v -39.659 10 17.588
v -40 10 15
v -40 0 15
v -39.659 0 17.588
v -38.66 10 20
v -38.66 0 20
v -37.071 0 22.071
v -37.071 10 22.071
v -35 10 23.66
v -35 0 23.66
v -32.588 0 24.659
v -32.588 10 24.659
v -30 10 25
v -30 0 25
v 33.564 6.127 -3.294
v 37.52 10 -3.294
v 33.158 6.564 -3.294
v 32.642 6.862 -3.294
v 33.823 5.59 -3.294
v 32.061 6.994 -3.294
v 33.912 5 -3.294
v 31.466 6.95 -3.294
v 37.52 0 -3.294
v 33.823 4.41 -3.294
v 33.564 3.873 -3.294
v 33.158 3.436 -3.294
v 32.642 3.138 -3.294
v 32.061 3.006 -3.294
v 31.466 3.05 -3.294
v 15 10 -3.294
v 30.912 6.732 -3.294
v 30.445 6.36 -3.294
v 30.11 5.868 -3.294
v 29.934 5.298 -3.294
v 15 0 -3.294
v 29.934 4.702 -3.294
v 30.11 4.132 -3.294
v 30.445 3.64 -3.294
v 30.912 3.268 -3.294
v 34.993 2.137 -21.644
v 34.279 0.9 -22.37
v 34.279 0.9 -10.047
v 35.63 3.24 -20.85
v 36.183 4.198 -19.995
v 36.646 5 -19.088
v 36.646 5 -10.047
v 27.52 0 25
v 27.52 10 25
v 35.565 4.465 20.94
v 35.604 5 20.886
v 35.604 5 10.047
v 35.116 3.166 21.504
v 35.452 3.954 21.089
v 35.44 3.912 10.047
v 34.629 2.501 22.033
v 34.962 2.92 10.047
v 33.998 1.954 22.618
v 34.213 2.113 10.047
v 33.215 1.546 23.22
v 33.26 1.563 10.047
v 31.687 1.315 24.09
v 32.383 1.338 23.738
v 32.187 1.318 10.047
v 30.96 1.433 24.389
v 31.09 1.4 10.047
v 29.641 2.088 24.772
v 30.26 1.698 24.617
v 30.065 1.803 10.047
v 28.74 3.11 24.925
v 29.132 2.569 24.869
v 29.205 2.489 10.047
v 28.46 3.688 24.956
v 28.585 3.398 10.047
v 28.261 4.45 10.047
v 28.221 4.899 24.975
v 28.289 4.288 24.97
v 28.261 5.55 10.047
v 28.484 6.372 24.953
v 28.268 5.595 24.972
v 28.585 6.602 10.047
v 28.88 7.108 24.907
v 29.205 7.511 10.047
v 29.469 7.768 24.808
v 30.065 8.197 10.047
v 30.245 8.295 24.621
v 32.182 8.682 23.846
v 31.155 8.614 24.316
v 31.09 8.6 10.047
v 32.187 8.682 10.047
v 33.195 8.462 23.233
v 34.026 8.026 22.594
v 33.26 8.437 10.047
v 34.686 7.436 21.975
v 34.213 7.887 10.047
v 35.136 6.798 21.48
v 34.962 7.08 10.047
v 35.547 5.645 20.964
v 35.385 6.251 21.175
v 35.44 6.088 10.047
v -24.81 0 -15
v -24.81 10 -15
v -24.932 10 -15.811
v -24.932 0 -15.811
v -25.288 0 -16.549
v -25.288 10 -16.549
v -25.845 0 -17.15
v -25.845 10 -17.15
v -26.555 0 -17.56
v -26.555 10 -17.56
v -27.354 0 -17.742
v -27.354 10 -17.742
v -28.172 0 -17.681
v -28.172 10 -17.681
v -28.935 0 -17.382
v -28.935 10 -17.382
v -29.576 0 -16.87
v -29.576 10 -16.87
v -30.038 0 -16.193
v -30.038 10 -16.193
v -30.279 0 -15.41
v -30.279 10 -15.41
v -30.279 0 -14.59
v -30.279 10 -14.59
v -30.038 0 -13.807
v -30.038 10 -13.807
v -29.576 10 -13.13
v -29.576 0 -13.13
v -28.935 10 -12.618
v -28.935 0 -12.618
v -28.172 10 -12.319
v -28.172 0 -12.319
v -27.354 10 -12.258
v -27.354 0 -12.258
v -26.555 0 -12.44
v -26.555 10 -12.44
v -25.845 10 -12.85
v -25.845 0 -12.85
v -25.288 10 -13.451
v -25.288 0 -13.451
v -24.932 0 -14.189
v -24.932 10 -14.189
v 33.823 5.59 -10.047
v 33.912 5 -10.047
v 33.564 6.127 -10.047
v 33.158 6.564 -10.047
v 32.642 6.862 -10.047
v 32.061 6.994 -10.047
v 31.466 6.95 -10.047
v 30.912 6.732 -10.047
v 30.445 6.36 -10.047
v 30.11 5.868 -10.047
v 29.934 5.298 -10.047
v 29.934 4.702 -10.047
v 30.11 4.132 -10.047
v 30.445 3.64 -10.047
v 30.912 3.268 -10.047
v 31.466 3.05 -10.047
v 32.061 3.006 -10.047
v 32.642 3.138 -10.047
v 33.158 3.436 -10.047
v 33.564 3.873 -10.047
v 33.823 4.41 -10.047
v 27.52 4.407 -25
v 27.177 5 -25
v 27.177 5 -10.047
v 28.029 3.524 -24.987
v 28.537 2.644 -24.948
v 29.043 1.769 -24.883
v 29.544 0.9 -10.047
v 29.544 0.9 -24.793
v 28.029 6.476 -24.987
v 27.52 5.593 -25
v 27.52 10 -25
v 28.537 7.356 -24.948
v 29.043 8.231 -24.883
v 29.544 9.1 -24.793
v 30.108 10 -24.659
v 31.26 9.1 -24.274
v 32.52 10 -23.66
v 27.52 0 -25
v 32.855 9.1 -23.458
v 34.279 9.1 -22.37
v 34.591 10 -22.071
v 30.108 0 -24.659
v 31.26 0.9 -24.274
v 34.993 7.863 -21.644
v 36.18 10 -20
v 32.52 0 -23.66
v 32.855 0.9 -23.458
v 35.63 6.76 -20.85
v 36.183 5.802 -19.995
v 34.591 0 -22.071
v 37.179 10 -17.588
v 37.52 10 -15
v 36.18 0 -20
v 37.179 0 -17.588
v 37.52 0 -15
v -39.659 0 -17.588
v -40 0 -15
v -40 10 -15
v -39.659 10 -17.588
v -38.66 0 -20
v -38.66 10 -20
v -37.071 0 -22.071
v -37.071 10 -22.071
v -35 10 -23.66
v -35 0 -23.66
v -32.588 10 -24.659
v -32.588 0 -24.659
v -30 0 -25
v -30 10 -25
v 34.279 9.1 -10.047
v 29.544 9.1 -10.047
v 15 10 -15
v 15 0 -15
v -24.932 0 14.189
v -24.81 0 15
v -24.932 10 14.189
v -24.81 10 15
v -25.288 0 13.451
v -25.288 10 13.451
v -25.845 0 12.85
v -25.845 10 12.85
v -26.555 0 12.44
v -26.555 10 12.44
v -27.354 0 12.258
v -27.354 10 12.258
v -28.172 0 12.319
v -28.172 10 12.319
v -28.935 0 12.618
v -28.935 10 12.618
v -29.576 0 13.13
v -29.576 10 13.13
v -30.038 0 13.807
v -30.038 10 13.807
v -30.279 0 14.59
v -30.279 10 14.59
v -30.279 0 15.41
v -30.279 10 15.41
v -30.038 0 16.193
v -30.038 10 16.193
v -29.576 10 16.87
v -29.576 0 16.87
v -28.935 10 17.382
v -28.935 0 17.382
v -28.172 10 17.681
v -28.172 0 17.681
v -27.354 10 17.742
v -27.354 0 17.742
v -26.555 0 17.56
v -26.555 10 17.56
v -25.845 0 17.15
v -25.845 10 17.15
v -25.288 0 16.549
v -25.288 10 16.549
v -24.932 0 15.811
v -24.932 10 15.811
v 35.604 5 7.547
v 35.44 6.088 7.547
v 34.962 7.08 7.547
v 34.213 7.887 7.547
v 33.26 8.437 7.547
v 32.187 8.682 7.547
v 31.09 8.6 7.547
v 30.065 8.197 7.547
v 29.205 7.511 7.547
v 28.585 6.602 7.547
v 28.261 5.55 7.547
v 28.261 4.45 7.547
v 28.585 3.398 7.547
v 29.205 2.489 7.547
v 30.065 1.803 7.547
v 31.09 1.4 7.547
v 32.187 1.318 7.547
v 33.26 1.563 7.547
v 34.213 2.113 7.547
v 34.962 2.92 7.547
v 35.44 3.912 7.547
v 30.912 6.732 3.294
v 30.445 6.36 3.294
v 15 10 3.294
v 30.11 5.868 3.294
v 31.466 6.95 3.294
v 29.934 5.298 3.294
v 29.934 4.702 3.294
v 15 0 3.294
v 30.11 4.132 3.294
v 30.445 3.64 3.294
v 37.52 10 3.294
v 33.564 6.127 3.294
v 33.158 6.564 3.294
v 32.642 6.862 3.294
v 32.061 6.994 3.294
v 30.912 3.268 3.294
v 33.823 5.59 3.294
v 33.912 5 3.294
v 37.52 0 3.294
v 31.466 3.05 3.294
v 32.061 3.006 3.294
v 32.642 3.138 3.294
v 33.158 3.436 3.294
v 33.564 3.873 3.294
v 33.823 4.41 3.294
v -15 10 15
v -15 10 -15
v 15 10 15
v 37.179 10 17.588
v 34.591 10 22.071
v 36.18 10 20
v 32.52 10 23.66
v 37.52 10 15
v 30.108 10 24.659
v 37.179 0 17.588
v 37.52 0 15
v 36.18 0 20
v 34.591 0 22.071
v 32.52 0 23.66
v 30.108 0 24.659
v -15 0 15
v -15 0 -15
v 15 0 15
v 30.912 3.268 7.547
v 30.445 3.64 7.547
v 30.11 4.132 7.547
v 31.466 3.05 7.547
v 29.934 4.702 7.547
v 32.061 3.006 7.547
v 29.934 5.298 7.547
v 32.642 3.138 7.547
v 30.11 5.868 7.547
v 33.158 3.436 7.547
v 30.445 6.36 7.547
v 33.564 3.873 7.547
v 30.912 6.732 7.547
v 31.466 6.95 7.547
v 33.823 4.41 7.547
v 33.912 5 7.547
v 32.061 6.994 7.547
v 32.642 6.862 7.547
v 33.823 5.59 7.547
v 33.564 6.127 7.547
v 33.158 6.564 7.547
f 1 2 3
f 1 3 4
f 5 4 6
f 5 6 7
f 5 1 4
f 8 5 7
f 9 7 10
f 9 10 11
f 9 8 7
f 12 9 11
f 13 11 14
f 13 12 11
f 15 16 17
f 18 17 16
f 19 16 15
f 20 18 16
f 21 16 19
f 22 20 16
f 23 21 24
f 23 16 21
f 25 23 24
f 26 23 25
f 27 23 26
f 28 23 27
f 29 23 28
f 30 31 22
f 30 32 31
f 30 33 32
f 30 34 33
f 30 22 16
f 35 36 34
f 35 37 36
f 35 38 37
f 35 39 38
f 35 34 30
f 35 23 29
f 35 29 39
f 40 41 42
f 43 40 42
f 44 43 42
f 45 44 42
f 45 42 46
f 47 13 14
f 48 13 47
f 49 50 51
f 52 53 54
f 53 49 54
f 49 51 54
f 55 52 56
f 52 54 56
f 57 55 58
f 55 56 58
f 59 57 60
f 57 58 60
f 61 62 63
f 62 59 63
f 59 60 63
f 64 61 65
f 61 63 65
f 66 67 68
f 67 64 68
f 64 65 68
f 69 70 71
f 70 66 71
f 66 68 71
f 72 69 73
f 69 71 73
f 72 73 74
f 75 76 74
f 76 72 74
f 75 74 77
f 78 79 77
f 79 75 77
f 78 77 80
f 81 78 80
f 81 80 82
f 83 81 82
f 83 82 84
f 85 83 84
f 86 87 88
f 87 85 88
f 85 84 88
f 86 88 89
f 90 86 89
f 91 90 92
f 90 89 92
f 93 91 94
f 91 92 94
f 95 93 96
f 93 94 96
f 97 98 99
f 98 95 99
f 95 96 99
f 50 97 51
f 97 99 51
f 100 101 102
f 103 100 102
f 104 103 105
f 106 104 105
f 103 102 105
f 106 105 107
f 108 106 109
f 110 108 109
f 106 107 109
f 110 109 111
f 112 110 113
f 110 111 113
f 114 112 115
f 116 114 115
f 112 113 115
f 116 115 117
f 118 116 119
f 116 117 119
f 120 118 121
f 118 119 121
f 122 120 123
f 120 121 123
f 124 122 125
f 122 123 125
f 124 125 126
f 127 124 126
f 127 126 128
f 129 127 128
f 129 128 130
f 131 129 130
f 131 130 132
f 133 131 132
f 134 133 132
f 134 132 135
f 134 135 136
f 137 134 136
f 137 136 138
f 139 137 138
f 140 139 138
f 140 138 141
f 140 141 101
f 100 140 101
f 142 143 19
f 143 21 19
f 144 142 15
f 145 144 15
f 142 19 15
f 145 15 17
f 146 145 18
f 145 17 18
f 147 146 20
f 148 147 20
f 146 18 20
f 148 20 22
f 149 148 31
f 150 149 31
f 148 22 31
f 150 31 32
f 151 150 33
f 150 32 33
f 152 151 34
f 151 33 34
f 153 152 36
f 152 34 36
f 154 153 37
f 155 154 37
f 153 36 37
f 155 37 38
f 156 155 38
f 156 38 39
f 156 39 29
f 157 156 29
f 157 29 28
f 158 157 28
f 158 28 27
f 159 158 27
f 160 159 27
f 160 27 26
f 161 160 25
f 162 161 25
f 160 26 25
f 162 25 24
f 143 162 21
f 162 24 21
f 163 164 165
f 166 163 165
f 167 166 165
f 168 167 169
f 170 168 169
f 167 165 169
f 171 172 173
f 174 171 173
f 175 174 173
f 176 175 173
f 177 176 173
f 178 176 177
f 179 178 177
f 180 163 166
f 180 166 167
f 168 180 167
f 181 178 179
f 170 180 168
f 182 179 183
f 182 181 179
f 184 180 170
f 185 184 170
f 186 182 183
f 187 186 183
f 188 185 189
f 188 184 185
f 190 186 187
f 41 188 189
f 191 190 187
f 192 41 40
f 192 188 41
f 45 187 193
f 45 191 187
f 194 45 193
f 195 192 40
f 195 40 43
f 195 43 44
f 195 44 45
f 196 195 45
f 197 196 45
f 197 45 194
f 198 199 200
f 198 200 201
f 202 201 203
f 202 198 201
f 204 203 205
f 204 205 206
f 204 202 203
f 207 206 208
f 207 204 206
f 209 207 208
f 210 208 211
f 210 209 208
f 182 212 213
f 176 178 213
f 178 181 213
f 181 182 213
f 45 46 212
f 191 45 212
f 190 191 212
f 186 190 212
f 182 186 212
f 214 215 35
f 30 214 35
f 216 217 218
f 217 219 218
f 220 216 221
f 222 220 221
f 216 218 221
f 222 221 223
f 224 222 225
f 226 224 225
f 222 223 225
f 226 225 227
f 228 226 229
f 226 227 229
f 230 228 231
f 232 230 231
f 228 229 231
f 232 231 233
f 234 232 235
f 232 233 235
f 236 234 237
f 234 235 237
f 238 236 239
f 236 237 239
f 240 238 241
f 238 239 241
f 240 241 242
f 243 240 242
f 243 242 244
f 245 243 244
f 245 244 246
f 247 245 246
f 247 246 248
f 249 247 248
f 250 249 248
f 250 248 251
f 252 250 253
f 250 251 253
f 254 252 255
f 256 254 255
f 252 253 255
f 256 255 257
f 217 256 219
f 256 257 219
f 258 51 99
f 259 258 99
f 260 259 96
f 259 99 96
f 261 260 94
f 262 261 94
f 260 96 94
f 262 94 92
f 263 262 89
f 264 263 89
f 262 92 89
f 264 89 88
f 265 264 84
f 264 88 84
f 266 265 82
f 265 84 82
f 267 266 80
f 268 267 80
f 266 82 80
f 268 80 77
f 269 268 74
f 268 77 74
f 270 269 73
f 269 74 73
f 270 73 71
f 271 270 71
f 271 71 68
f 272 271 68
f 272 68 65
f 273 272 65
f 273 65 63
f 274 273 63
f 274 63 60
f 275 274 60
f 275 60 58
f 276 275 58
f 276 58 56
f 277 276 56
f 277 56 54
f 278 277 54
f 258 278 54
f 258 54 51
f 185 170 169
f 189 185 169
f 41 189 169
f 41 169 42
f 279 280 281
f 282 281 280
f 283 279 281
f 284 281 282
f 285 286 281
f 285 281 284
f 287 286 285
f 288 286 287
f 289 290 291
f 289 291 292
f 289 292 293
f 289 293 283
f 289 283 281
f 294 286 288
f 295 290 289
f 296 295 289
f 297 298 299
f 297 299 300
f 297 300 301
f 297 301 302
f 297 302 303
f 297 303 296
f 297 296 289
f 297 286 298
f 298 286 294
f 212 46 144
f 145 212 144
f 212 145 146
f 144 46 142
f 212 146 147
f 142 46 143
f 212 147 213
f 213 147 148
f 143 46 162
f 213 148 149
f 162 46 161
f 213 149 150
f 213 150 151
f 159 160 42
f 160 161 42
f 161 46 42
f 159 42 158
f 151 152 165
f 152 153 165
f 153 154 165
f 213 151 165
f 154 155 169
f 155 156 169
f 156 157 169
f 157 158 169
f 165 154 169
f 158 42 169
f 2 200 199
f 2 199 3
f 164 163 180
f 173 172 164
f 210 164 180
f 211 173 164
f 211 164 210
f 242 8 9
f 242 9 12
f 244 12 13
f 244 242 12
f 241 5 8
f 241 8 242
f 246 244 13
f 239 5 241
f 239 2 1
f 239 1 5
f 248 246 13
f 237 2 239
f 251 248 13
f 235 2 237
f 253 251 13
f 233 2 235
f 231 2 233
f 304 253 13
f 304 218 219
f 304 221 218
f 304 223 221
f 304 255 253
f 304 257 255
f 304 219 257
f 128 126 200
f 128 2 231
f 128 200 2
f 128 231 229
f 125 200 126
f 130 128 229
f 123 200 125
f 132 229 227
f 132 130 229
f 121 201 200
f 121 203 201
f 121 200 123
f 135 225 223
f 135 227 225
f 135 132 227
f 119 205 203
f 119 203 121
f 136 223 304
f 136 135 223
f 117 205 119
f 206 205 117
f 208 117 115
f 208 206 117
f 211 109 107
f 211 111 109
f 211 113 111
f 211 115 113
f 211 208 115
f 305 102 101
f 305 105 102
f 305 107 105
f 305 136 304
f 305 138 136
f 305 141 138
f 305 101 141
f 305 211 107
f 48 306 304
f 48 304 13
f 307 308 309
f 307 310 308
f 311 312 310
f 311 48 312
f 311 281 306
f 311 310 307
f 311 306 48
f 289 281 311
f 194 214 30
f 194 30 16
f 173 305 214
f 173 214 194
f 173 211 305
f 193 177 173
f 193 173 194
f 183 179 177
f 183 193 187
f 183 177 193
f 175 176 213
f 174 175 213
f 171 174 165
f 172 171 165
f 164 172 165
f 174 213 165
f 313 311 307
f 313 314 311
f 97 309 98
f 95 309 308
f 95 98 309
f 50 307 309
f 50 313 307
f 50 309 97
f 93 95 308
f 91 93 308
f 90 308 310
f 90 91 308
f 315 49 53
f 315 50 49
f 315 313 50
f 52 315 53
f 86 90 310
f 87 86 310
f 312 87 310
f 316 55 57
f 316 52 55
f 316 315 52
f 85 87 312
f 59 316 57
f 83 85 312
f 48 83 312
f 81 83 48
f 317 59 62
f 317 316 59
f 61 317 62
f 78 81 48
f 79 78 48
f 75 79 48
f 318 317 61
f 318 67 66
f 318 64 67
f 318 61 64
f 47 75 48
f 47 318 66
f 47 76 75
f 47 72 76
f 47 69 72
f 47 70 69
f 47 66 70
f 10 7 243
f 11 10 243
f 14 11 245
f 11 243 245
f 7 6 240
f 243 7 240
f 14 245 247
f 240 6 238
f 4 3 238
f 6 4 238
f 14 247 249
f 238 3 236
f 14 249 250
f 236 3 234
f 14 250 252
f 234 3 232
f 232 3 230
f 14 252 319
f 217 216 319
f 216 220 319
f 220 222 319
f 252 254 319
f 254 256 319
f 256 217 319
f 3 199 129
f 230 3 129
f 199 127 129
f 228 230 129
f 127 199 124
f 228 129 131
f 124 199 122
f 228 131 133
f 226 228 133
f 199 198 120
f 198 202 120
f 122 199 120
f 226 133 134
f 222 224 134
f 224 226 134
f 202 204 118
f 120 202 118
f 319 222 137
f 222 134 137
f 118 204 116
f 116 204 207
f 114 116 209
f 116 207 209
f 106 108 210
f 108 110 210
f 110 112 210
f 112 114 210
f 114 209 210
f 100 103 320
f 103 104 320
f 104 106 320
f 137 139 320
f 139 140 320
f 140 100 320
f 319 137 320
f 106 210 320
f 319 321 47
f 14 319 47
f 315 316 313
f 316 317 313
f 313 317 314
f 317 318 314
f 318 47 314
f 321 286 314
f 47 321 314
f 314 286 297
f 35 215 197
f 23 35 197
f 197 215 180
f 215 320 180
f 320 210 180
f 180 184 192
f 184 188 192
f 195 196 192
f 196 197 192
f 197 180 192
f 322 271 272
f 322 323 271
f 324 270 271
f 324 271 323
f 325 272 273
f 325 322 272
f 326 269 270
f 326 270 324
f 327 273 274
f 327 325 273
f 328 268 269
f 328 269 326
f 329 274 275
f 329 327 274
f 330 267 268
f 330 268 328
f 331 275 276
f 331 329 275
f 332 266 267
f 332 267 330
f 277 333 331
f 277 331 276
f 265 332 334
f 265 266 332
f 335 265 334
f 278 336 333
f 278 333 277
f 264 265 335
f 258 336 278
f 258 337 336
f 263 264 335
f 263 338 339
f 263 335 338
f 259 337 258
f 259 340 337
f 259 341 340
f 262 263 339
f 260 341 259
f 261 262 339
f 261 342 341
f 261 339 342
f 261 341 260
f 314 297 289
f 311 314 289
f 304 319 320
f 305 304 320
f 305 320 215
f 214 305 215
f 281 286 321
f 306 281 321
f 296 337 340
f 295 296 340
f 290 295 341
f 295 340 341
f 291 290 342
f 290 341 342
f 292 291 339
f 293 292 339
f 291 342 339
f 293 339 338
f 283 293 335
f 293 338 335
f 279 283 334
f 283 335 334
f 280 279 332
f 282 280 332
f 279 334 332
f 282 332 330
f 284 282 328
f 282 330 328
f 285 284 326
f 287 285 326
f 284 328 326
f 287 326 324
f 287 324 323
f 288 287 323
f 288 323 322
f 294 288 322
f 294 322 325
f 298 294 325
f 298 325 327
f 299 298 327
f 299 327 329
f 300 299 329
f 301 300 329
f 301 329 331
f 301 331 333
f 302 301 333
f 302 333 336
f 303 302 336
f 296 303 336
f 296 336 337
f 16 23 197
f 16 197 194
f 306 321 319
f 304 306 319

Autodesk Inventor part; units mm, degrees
ref_plane "YZ Plane" through (0, 0, 0) normal (1, 0, 0) x (0, 1, 0)
ref_plane "XZ Plane" through (0, 0, 0) normal (0, 1, 0) x (-1, 0, 0)
ref_plane "XY Plane" through (0, 0, 0) normal (0, 0, 1) x (1, 0, 0)
sketch "Sketch1" plane through (0, 0, 0) normal (0, 1, 0) x (-1, 0, 0)
  line L0 (-15, 15) -> (15, 15)
  line L1 (15, 15) -> (15, -15)
  line L2 (15, -15) -> (-15, -15)
  line L3 (-15, 15) -> (15, -15) construction
  line L4 (15, 15) -> (-15, -15) construction
  line L5 (25, 25) -> (-25, 25)
  line L6 (-25.5008, -25) -> (24.4992, -25)
  line L7 (25, 25) -> (59.45, 25)
  line L8 (59.45, 25) -> (59.45, -25)
  line L9 (59.45, -25) -> (24.4992, -25)
  line L10 (-37.5196, -10.0467) -> (-25.5008, -10.0467)
  line L11 (-25, 10.0467) -> (-37.5196, 10.0467)
  line L12 (-37.5196, -3.2939) -> (-15, -3.2939)
  line L13 (-15, 3.2939) -> (-37.5196, 3.2939)
  line L14 (-37.5196, 10.0467) -> (-37.5196, 3.2939)
  line L15 (-37.5196, -3.2939) -> (-37.5196, -10.0467)
  line L16 (-25, 25) -> (-25, 10.0467)
  line L17 (-15, -15) -> (-15, -3.2939)
  line L18 (-15, 3.2939) -> (-15, 15)
  line L19 (-25.5008, -10.0467) -> (-25.5008, -25)
  point P0 (0, 0)
  point P1 (-30.7833, 0)
  point P2 (25, -25)
  dimension "d0" = 30
  dimension "d1" = 30
  dimension "d2" = 10
  dimension "d4" = 44.45
extrude "Extrusion1" add sketch "Sketch1" along normal blind 10
sketch "Sketch2" plane through (0, 0, 0) normal (0, -1, 0) x (1, 0, 0)
  line L0 (15, 15) -> (-15, 15) projected
  line L1 (15, 3.2939) -> (15, 15) projected
  line L2 (37.5196, 3.2939) -> (15, 3.2939) projected
  line L3 (37.5196, 10.0467) -> (37.5196, 3.2939) projected
  line L4 (25, 10.0467) -> (37.5196, 10.0467) projected
  line L5 (25, 25) -> (25, 10.0467) projected
  line L6 (-59.45, 25) -> (25, 25) projected
  line L7 (-59.45, -25) -> (-59.45, 25) projected
  line L8 (25.5008, -25) -> (-59.45, -25) projected
  line L9 (25.5008, -10.0467) -> (25.5008, -25) projected
  line L10 (37.5196, -10.0467) -> (25.5008, -10.0467) projected
  line L11 (37.5196, -3.2939) -> (37.5196, -10.0467) projected
  line L12 (15, -3.2939) -> (37.5196, -3.2939) projected
  line L13 (15, -15) -> (15, -3.2939) projected
  line L14 (-15, -15) -> (15, -15) projected
  line L15 (-15, 15) -> (-15, -15) projected
  line L16 (-49.725, -25) -> (-24.725, -25)
  line L17 (-24.725, -25) -> (-24.725, 25)
  line L18 (-24.725, 25) -> (-49.725, 25)
  line L19 (-49.725, 25) -> (-49.725, -25)
  line L20 (-49.725, -25) -> (-24.725, 25) construction
  line L21 (-24.725, -25) -> (-49.725, 25) construction
  line L22 (-59.45, 25) -> (25, 25) projected
  line L23 (-15, 25) -> (-15, -25)
  line L24 (25.5008, -25) -> (-59.45, -25) projected
  line L25 (-59.45, 25) -> (-49.725, 25)
  line L26 (-59.45, 25) -> (25, 25) projected
  line L27 (-24.725, 25) -> (-15, 25)
  line L28 (-59.45, 21.5922) -> (-49.725, 21.5922)
  line L29 (-24.725, 21.5922) -> (-15, 21.5922)
  line L30 (-15, 15) -> (-15, -15) projected
  point P0 (0, 0)
  point P1 (-37.225, 0)
  point P2 (-15, -25)
  dimension "d7" = 25
extrude "Extrusion2" add sketch "Sketch2" along normal blind 25 contours L15 L23 L8 L17 L29 | L29 L17 L6 L23 | L8 L7 L28 L19 | L19 L28 L7 L6
sketch "Sketch3" plane through (-24.725, 0, -25) normal (-1, 0, 0) x (0, 0, 1)
  line L0 (0, 0) -> (50, 0) construction
  line L1 (0, 0) -> (0, -25) construction
  line L2 (50, -25) -> (0, -25) construction
  line L3 (50, 0) -> (50, -25) construction
  line L4 (0, -12.5) -> (50, -12.5) construction
  line L5 (50, 0) -> (50, -25) construction
  line L6 (15, -12.5) -> (35, -12.5) construction
  line L7 (15, -15.2) -> (35, -15.2) construction
  line L8 (35, -9.8) -> (15, -9.8) construction
  arc A0 (15, -9.8) -> (15, -15.2) centre (15, -12.5) ccw construction
  arc A1 (35, -15.2) -> (35, -9.8) centre (35, -12.5) ccw
  circle A2 centre (35, -12.5) radius 2.7
  circle A3 centre (15, -12.5) radius 2.7
  point P0 (25, 0)
  point P1 (25, -12.5)
  point P2 (35, -9.8)
  dimension "d10" = 20
  dimension "d11" = 2.7
extrude "Extrusion3" cut sketch "Sketch3" along normal through all both and the other way through all
sketch "Sketch4" plane through (37.5196, 0, 10.0467) normal (0, 0, 1) x (1, 0, 0)
  line L0 (-12.5196, 0) -> (0, 0) projected
  line L1 (0, 0) -> (0, 10) projected
  line L2 (-12.5196, 10) -> (0, 10) projected
  circle A0 centre (-5.6081, 5) radius 2
  line L3 (-12.5196, 0) -> (-12.5196, 10) projected
  point P0 (-37.5196, 0)
  dimension "d15" = 4
extrude "Extrusion4" cut sketch "Sketch4" against normal through all contours A0
sketch "Sketch5" plane through (37.5196, 0, 10.0467) normal (0, 0, 1) x (1, 0, 0)
  circle A0 centre (-5.6081, 5) radius 2 projected
  circle A1 centre (-5.6081, 5) radius 3.6921
  point P0 (-37.5196, 0)
  point P1 (-9.307, 3.7757)
  point P2 (-9.307, 6.2243)
extrude "Extrusion5" cut sketch "Sketch5" along normal mid plane 5 contours A0 | A1
sketch "Sketch6" plane through (0, 10, 0) normal (0, 1, 0) x (1, 0, 0)
  line L0 (25, -25) -> (25, -10.0467) projected
  line L1 (25, -10.0467) -> (37.5196, -10.0467) projected
  line L2 (37.5196, -10.0467) -> (37.5196, -3.2939) projected
  line L3 (37.5196, -3.2939) -> (15, -3.2939) projected
  line L4 (15, -3.2939) -> (15, -15) projected
  line L5 (15, -15) -> (-15, -15) projected
  line L6 (-15, -15) -> (-15, 15) projected
  line L7 (-15, 15) -> (15, 15) projected
  line L8 (15, 15) -> (15, 3.2939) projected
  line L9 (15, 3.2939) -> (37.5196, 3.2939) projected
  line L10 (37.5196, 3.2939) -> (37.5196, 10.0467) projected
  line L11 (37.5196, 10.0467) -> (25.5008, 10.0467) projected
  line L12 (25.5008, 10.0467) -> (25.5008, 25) projected
  line L13 (25.5008, 25) -> (-59.45, 25) projected
  line L14 (-59.45, 25) -> (-59.45, -25) projected
  line L15 (-59.45, -25) -> (25, -25) projected
  line L16 (-59.45, -25) -> (20, -25) projected
  line L17 (-25, -25) -> (-25, 25)
  point P0 (0, 0)
  dimension "d20" = 10
  dimension "d21" = 10
extrude "Extrusion6" cut sketch "Sketch6" against normal through all contours L15 L14 L13 L17
sketch "Sketch7" plane through (-24.725, 0, -25) normal (-1, 0, 0) x (0, 0, 1)
  circle A0 centre (35, -12.5) radius 2.7 projected
  circle A1 centre (15, -12.5) radius 2.7 projected
  line L0 (50, -25) -> (0, -25) projected
  line L1 (50, 0) -> (50, -25) projected
  line L2 (0, 0) -> (50, 0) projected
  line L3 (0, 0) -> (0, -25) projected
  point P0 (25, 0)
extrude "Extrusion7" cut sketch "Sketch7" against normal through all
sketch "Sketch8" plane through (-25, 10, -25) normal (-1, 0, 0) x (0, 0, 1)
  line L0 (50, -10) -> (0, -10) projected
  line L1 (50, 0) -> (50, -10) projected
  line L2 (0, 0) -> (50, 0) projected
  line L3 (0, -10) -> (0, 0) projected
  point P0 (25, -10)
extrude "Extrusion8" add sketch "Sketch8" along normal blind 15
sketch "Sketch9" plane through (37.5196, 0, -10.0467) normal (0, 0, -1) x (-1, 0, 0)
  circle A0 centre (5.6081, 5) radius 2 projected
  line L0 (0, 0) -> (12.0187, 0) projected
  line L1 (12.0187, 0) -> (12.0187, 10) projected
  line L2 (0, 10) -> (12.0187, 10) projected
  line L3 (0, 0) -> (0, 10) projected
  circle A1 centre (5.6081, 5) radius 3.6921 projected
  line L4 (7.9753, 9.1) -> (10.3424, 5)
  line L5 (10.3424, 5) -> (7.9753, 0.9)
  line L6 (7.9753, 0.9) -> (3.241, 0.9)
  line L7 (3.241, 0.9) -> (0.8739, 5)
  line L8 (0.8739, 5) -> (3.241, 9.1)
  line L9 (3.241, 9.1) -> (7.9753, 9.1)
  point P0 (37.5196, 0)
  point P1 (8.8062, 2.3392)
  point P2 (8.8062, 7.6608)
  point P3 (8.8062, 6.8449)
  point P4 (8.8062, 3.1551)
  dimension "d28" = 8.2
extrude "Extrusion9" add sketch "Sketch9" along normal up to surface (14.9533 mm away) contours L3 L2 L1 L0
sketch "Sketch10" plane through (25, 0, 10.0467) normal (0, 0, 1) x (1, 0, 0)
  circle A0 centre (6.9114, 5) radius 3.6921 projected
  line L0 (0, 0) -> (12.5196, 0) projected
  line L1 (12.5196, 0) -> (12.5196, 10) projected
  line L2 (0, 10) -> (12.5196, 10) projected
  line L3 (0, 0) -> (0, 10) projected
  point P0 (-25, 0)
extrude "Extrusion10" add sketch "Sketch10" along normal up to surface (14.9533 mm away)
sketch "Sketch11" plane through (0, 10, 0) normal (0, 1, 0) x (1, 0, 0)
  line L0 (-40.28, -55.2921) -> (-40.28, 159.5519) projected
  line L1 (-15.12, -75.3901) -> (-15.12, 179.6099) projected
  line L2 (-40, -25) -> (37.5196, -25) projected
  line L3 (37.5196, -3.2939) -> (37.5196, -25) projected
  line L4 (37.5196, -3.2939) -> (15, -3.2939) projected
  line L5 (15, -3.2939) -> (15, -15) projected
  line L6 (15, -15) -> (-15, -15) projected
  line L7 (-15, -15) -> (-15, 15) projected
  line L8 (-15, 15) -> (15, 15) projected
  line L9 (15, 15) -> (15, 3.2939) projected
  line L10 (15, 3.2939) -> (37.5196, 3.2939) projected
  line L11 (37.5196, 3.2939) -> (37.5196, 25) projected
  line L12 (37.5196, 25) -> (-40, 25) projected
  line L13 (-40, -25) -> (-40, 25) projected
  line L14 (-15.12, 25) -> (-40, 25) construction
  circle A0 centre (-27.56, 15) radius 2.75
  circle A1 centre (-27.56, -15) radius 2.75
  point P0 (0, 0)
  dimension "d33" = 5.5
extrude "Extrusion11" cut sketch "Sketch11" against normal through all contours A0 | A1
fillet "Fillet2" radius 10 4 edges at (37.5196, 5, 25) (37.5196, 5, -25) (-40, 5, 25) (-40, 5, -25)
properties part number "estopMountV2"
